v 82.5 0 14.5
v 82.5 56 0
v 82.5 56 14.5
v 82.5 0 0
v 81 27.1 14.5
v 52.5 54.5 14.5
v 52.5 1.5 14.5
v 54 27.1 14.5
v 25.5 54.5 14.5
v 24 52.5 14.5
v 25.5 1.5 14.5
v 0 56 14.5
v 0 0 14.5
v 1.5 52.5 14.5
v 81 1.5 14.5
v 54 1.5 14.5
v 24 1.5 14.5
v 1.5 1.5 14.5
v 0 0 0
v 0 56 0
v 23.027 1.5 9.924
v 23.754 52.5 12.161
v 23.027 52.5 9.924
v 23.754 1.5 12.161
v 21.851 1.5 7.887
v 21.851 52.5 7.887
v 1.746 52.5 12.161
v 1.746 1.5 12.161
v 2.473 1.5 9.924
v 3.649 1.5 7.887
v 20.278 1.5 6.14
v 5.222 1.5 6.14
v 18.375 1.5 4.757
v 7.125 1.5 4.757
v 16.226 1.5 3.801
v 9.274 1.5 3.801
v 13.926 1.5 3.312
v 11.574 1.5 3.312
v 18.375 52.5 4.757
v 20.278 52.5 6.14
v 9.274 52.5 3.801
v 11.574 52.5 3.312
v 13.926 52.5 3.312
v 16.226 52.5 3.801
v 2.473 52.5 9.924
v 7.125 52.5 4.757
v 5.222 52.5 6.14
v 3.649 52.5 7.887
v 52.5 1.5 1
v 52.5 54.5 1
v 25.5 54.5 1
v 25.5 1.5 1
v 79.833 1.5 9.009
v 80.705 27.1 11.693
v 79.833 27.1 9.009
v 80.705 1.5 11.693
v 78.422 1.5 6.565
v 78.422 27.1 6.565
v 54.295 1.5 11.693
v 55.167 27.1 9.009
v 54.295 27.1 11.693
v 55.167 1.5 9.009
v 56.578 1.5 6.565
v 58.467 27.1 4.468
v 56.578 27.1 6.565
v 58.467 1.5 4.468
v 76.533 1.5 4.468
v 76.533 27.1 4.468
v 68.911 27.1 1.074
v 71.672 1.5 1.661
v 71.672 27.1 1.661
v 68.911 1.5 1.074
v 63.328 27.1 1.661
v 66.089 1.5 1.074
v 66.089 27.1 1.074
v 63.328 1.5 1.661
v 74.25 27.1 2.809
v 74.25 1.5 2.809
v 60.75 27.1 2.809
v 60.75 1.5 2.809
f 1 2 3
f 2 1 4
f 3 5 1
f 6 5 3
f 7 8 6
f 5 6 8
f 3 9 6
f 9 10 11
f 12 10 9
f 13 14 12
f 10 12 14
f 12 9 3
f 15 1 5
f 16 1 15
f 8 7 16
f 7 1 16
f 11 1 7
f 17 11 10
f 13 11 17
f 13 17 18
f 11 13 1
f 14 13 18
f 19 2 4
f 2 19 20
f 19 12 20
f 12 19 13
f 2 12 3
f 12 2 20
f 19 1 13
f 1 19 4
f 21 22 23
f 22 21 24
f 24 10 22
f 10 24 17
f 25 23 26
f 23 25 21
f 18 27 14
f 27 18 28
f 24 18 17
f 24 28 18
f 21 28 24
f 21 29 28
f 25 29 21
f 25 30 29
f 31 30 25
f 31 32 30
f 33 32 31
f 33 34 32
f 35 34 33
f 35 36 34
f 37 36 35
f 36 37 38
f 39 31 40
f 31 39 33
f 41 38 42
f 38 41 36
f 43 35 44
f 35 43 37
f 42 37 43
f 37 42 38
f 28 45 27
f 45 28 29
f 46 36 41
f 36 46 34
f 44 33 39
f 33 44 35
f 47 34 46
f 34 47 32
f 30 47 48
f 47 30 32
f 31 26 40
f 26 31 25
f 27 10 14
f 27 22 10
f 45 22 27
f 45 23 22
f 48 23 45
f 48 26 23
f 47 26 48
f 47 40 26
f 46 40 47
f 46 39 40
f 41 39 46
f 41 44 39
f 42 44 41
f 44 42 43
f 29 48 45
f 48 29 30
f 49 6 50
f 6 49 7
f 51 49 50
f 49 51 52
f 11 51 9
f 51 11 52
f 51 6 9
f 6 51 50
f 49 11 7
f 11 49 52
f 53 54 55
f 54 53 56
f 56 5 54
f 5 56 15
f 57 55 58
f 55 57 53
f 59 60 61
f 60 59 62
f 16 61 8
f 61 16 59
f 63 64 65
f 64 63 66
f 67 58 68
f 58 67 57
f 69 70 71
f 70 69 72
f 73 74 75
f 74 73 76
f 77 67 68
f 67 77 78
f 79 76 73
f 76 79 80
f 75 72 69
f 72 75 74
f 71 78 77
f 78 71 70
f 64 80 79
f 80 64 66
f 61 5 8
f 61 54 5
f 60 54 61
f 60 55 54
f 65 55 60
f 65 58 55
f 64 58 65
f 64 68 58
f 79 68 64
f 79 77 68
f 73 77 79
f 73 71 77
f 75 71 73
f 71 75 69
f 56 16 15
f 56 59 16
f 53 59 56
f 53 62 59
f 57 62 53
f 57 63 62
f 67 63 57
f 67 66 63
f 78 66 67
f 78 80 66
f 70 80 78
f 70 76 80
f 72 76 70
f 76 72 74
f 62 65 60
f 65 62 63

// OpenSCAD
// file: consts.scad
$fs = 0.5;

FLOOR = 1;
WALL = 1.5;
THIN_WALL = 0.6;

SQUARE_TILE = 27; // 25.46mm
TILE_THICK = 3; // 2.18

RESOURCE_STACK = 53; // 51.43mm, 32 tokens

CUBE = 9; // 8.6mm

VOTING_TRIANGLE = 29; // 27.44mm
VOTING_STACK = 28; // 26.17, 12 tokens

// Discs
CLAIM_DIA = 13; // 11.83
CLAIM_H = 4; //3.78
CLAIM_STACK = 58; // 55.58

// TOKEN_STACK = 21; // 19.56, 9 tokens
TOKEN_STACK = 14; // 13.02, 6 square tokens

// Cubes
DELIVERY_STACK_D = 58; //55.71
DELIVERY_STACK_W = 18; //16.30
DELIVERY_STACK_H = DELIVERY_STACK_W;

MEEPLE_W = 17; //16.30
MEEPLE_H = 21; //20.23
MEEPLE_STACK = 30.5; //29.01

MONEY_1_DIA = 22.5; //21.22
MONEY_1_STACK = 51; // 49.60
MONEY_3_DIA = 27; //25.64
MONEY_3_STACK = 25.6; //23.97

ROAD_STACK = 53; //51.43

TOKEN_BOX_W = DELIVERY_STACK_W + MEEPLE_W + CLAIM_DIA + WALL * 4;
TOKEN_BOX_D = max(DELIVERY_STACK_D, SQUARE_TILE + WALL + MEEPLE_STACK, CLAIM_STACK) + WALL*2;
TOKEN_BOX_H = DELIVERY_STACK_H + FLOOR - CUBE/2;

BANK_BOX_W = MONEY_1_DIA + MONEY_3_DIA + SQUARE_TILE + WALL*4;
BANK_BOX_D = max(MONEY_1_STACK, MONEY_3_STACK, ROAD_STACK) + WALL*2;
BANK_BOX_H = max(MONEY_1_DIA, MONEY_3_DIA, SQUARE_TILE)/2 + FLOOR;

CARD_W = 65; // 63.42
CARD_H = 91; // 89.37

CARD_STACK_INCOME = 1.5; // 0.62, 2 cards
CARD_STACK_ACTION = 2.5; // 1.54, 5 cards, 4 stacks of these
CARD_STACK_ADVISOR = 6.5; // 5.55, 18 cards
CARD_STACK_BUILDING = 7.5; // 6.52, 21 cards

CARD_BOX_W = WALL*2 + CARD_H;
CARD_BOX_D = WALL*3 + THIN_WALL*6 + CARD_STACK_INCOME + CARD_STACK_ACTION*4 + CARD_STACK_ADVISOR + CARD_STACK_BUILDING + max(SQUARE_TILE, VOTING_STACK);
CARD_BOX_H = CARD_W/2 + FLOOR;

CLIP_DIA = 7;
// main file
include <consts.scad>;



difference() {
    cube([BANK_BOX_W, BANK_BOX_D, BANK_BOX_H]);

    translate([WALL + MONEY_1_DIA/2, WALL, BANK_BOX_H]) rotate([-90, 00, 0]) cylinder(d=MONEY_1_DIA, h=MONEY_1_STACK);
    translate([WALL*2 + MONEY_1_DIA, WALL, BANK_BOX_H - SQUARE_TILE/2]) cube([SQUARE_TILE, ROAD_STACK, SQUARE_TILE]);
    translate([WALL*3 + MONEY_1_DIA + SQUARE_TILE + MONEY_3_DIA/2, WALL, BANK_BOX_H]) rotate([-90, 00, 0]) cylinder(d=MONEY_3_DIA, h=MONEY_3_STACK);
}
